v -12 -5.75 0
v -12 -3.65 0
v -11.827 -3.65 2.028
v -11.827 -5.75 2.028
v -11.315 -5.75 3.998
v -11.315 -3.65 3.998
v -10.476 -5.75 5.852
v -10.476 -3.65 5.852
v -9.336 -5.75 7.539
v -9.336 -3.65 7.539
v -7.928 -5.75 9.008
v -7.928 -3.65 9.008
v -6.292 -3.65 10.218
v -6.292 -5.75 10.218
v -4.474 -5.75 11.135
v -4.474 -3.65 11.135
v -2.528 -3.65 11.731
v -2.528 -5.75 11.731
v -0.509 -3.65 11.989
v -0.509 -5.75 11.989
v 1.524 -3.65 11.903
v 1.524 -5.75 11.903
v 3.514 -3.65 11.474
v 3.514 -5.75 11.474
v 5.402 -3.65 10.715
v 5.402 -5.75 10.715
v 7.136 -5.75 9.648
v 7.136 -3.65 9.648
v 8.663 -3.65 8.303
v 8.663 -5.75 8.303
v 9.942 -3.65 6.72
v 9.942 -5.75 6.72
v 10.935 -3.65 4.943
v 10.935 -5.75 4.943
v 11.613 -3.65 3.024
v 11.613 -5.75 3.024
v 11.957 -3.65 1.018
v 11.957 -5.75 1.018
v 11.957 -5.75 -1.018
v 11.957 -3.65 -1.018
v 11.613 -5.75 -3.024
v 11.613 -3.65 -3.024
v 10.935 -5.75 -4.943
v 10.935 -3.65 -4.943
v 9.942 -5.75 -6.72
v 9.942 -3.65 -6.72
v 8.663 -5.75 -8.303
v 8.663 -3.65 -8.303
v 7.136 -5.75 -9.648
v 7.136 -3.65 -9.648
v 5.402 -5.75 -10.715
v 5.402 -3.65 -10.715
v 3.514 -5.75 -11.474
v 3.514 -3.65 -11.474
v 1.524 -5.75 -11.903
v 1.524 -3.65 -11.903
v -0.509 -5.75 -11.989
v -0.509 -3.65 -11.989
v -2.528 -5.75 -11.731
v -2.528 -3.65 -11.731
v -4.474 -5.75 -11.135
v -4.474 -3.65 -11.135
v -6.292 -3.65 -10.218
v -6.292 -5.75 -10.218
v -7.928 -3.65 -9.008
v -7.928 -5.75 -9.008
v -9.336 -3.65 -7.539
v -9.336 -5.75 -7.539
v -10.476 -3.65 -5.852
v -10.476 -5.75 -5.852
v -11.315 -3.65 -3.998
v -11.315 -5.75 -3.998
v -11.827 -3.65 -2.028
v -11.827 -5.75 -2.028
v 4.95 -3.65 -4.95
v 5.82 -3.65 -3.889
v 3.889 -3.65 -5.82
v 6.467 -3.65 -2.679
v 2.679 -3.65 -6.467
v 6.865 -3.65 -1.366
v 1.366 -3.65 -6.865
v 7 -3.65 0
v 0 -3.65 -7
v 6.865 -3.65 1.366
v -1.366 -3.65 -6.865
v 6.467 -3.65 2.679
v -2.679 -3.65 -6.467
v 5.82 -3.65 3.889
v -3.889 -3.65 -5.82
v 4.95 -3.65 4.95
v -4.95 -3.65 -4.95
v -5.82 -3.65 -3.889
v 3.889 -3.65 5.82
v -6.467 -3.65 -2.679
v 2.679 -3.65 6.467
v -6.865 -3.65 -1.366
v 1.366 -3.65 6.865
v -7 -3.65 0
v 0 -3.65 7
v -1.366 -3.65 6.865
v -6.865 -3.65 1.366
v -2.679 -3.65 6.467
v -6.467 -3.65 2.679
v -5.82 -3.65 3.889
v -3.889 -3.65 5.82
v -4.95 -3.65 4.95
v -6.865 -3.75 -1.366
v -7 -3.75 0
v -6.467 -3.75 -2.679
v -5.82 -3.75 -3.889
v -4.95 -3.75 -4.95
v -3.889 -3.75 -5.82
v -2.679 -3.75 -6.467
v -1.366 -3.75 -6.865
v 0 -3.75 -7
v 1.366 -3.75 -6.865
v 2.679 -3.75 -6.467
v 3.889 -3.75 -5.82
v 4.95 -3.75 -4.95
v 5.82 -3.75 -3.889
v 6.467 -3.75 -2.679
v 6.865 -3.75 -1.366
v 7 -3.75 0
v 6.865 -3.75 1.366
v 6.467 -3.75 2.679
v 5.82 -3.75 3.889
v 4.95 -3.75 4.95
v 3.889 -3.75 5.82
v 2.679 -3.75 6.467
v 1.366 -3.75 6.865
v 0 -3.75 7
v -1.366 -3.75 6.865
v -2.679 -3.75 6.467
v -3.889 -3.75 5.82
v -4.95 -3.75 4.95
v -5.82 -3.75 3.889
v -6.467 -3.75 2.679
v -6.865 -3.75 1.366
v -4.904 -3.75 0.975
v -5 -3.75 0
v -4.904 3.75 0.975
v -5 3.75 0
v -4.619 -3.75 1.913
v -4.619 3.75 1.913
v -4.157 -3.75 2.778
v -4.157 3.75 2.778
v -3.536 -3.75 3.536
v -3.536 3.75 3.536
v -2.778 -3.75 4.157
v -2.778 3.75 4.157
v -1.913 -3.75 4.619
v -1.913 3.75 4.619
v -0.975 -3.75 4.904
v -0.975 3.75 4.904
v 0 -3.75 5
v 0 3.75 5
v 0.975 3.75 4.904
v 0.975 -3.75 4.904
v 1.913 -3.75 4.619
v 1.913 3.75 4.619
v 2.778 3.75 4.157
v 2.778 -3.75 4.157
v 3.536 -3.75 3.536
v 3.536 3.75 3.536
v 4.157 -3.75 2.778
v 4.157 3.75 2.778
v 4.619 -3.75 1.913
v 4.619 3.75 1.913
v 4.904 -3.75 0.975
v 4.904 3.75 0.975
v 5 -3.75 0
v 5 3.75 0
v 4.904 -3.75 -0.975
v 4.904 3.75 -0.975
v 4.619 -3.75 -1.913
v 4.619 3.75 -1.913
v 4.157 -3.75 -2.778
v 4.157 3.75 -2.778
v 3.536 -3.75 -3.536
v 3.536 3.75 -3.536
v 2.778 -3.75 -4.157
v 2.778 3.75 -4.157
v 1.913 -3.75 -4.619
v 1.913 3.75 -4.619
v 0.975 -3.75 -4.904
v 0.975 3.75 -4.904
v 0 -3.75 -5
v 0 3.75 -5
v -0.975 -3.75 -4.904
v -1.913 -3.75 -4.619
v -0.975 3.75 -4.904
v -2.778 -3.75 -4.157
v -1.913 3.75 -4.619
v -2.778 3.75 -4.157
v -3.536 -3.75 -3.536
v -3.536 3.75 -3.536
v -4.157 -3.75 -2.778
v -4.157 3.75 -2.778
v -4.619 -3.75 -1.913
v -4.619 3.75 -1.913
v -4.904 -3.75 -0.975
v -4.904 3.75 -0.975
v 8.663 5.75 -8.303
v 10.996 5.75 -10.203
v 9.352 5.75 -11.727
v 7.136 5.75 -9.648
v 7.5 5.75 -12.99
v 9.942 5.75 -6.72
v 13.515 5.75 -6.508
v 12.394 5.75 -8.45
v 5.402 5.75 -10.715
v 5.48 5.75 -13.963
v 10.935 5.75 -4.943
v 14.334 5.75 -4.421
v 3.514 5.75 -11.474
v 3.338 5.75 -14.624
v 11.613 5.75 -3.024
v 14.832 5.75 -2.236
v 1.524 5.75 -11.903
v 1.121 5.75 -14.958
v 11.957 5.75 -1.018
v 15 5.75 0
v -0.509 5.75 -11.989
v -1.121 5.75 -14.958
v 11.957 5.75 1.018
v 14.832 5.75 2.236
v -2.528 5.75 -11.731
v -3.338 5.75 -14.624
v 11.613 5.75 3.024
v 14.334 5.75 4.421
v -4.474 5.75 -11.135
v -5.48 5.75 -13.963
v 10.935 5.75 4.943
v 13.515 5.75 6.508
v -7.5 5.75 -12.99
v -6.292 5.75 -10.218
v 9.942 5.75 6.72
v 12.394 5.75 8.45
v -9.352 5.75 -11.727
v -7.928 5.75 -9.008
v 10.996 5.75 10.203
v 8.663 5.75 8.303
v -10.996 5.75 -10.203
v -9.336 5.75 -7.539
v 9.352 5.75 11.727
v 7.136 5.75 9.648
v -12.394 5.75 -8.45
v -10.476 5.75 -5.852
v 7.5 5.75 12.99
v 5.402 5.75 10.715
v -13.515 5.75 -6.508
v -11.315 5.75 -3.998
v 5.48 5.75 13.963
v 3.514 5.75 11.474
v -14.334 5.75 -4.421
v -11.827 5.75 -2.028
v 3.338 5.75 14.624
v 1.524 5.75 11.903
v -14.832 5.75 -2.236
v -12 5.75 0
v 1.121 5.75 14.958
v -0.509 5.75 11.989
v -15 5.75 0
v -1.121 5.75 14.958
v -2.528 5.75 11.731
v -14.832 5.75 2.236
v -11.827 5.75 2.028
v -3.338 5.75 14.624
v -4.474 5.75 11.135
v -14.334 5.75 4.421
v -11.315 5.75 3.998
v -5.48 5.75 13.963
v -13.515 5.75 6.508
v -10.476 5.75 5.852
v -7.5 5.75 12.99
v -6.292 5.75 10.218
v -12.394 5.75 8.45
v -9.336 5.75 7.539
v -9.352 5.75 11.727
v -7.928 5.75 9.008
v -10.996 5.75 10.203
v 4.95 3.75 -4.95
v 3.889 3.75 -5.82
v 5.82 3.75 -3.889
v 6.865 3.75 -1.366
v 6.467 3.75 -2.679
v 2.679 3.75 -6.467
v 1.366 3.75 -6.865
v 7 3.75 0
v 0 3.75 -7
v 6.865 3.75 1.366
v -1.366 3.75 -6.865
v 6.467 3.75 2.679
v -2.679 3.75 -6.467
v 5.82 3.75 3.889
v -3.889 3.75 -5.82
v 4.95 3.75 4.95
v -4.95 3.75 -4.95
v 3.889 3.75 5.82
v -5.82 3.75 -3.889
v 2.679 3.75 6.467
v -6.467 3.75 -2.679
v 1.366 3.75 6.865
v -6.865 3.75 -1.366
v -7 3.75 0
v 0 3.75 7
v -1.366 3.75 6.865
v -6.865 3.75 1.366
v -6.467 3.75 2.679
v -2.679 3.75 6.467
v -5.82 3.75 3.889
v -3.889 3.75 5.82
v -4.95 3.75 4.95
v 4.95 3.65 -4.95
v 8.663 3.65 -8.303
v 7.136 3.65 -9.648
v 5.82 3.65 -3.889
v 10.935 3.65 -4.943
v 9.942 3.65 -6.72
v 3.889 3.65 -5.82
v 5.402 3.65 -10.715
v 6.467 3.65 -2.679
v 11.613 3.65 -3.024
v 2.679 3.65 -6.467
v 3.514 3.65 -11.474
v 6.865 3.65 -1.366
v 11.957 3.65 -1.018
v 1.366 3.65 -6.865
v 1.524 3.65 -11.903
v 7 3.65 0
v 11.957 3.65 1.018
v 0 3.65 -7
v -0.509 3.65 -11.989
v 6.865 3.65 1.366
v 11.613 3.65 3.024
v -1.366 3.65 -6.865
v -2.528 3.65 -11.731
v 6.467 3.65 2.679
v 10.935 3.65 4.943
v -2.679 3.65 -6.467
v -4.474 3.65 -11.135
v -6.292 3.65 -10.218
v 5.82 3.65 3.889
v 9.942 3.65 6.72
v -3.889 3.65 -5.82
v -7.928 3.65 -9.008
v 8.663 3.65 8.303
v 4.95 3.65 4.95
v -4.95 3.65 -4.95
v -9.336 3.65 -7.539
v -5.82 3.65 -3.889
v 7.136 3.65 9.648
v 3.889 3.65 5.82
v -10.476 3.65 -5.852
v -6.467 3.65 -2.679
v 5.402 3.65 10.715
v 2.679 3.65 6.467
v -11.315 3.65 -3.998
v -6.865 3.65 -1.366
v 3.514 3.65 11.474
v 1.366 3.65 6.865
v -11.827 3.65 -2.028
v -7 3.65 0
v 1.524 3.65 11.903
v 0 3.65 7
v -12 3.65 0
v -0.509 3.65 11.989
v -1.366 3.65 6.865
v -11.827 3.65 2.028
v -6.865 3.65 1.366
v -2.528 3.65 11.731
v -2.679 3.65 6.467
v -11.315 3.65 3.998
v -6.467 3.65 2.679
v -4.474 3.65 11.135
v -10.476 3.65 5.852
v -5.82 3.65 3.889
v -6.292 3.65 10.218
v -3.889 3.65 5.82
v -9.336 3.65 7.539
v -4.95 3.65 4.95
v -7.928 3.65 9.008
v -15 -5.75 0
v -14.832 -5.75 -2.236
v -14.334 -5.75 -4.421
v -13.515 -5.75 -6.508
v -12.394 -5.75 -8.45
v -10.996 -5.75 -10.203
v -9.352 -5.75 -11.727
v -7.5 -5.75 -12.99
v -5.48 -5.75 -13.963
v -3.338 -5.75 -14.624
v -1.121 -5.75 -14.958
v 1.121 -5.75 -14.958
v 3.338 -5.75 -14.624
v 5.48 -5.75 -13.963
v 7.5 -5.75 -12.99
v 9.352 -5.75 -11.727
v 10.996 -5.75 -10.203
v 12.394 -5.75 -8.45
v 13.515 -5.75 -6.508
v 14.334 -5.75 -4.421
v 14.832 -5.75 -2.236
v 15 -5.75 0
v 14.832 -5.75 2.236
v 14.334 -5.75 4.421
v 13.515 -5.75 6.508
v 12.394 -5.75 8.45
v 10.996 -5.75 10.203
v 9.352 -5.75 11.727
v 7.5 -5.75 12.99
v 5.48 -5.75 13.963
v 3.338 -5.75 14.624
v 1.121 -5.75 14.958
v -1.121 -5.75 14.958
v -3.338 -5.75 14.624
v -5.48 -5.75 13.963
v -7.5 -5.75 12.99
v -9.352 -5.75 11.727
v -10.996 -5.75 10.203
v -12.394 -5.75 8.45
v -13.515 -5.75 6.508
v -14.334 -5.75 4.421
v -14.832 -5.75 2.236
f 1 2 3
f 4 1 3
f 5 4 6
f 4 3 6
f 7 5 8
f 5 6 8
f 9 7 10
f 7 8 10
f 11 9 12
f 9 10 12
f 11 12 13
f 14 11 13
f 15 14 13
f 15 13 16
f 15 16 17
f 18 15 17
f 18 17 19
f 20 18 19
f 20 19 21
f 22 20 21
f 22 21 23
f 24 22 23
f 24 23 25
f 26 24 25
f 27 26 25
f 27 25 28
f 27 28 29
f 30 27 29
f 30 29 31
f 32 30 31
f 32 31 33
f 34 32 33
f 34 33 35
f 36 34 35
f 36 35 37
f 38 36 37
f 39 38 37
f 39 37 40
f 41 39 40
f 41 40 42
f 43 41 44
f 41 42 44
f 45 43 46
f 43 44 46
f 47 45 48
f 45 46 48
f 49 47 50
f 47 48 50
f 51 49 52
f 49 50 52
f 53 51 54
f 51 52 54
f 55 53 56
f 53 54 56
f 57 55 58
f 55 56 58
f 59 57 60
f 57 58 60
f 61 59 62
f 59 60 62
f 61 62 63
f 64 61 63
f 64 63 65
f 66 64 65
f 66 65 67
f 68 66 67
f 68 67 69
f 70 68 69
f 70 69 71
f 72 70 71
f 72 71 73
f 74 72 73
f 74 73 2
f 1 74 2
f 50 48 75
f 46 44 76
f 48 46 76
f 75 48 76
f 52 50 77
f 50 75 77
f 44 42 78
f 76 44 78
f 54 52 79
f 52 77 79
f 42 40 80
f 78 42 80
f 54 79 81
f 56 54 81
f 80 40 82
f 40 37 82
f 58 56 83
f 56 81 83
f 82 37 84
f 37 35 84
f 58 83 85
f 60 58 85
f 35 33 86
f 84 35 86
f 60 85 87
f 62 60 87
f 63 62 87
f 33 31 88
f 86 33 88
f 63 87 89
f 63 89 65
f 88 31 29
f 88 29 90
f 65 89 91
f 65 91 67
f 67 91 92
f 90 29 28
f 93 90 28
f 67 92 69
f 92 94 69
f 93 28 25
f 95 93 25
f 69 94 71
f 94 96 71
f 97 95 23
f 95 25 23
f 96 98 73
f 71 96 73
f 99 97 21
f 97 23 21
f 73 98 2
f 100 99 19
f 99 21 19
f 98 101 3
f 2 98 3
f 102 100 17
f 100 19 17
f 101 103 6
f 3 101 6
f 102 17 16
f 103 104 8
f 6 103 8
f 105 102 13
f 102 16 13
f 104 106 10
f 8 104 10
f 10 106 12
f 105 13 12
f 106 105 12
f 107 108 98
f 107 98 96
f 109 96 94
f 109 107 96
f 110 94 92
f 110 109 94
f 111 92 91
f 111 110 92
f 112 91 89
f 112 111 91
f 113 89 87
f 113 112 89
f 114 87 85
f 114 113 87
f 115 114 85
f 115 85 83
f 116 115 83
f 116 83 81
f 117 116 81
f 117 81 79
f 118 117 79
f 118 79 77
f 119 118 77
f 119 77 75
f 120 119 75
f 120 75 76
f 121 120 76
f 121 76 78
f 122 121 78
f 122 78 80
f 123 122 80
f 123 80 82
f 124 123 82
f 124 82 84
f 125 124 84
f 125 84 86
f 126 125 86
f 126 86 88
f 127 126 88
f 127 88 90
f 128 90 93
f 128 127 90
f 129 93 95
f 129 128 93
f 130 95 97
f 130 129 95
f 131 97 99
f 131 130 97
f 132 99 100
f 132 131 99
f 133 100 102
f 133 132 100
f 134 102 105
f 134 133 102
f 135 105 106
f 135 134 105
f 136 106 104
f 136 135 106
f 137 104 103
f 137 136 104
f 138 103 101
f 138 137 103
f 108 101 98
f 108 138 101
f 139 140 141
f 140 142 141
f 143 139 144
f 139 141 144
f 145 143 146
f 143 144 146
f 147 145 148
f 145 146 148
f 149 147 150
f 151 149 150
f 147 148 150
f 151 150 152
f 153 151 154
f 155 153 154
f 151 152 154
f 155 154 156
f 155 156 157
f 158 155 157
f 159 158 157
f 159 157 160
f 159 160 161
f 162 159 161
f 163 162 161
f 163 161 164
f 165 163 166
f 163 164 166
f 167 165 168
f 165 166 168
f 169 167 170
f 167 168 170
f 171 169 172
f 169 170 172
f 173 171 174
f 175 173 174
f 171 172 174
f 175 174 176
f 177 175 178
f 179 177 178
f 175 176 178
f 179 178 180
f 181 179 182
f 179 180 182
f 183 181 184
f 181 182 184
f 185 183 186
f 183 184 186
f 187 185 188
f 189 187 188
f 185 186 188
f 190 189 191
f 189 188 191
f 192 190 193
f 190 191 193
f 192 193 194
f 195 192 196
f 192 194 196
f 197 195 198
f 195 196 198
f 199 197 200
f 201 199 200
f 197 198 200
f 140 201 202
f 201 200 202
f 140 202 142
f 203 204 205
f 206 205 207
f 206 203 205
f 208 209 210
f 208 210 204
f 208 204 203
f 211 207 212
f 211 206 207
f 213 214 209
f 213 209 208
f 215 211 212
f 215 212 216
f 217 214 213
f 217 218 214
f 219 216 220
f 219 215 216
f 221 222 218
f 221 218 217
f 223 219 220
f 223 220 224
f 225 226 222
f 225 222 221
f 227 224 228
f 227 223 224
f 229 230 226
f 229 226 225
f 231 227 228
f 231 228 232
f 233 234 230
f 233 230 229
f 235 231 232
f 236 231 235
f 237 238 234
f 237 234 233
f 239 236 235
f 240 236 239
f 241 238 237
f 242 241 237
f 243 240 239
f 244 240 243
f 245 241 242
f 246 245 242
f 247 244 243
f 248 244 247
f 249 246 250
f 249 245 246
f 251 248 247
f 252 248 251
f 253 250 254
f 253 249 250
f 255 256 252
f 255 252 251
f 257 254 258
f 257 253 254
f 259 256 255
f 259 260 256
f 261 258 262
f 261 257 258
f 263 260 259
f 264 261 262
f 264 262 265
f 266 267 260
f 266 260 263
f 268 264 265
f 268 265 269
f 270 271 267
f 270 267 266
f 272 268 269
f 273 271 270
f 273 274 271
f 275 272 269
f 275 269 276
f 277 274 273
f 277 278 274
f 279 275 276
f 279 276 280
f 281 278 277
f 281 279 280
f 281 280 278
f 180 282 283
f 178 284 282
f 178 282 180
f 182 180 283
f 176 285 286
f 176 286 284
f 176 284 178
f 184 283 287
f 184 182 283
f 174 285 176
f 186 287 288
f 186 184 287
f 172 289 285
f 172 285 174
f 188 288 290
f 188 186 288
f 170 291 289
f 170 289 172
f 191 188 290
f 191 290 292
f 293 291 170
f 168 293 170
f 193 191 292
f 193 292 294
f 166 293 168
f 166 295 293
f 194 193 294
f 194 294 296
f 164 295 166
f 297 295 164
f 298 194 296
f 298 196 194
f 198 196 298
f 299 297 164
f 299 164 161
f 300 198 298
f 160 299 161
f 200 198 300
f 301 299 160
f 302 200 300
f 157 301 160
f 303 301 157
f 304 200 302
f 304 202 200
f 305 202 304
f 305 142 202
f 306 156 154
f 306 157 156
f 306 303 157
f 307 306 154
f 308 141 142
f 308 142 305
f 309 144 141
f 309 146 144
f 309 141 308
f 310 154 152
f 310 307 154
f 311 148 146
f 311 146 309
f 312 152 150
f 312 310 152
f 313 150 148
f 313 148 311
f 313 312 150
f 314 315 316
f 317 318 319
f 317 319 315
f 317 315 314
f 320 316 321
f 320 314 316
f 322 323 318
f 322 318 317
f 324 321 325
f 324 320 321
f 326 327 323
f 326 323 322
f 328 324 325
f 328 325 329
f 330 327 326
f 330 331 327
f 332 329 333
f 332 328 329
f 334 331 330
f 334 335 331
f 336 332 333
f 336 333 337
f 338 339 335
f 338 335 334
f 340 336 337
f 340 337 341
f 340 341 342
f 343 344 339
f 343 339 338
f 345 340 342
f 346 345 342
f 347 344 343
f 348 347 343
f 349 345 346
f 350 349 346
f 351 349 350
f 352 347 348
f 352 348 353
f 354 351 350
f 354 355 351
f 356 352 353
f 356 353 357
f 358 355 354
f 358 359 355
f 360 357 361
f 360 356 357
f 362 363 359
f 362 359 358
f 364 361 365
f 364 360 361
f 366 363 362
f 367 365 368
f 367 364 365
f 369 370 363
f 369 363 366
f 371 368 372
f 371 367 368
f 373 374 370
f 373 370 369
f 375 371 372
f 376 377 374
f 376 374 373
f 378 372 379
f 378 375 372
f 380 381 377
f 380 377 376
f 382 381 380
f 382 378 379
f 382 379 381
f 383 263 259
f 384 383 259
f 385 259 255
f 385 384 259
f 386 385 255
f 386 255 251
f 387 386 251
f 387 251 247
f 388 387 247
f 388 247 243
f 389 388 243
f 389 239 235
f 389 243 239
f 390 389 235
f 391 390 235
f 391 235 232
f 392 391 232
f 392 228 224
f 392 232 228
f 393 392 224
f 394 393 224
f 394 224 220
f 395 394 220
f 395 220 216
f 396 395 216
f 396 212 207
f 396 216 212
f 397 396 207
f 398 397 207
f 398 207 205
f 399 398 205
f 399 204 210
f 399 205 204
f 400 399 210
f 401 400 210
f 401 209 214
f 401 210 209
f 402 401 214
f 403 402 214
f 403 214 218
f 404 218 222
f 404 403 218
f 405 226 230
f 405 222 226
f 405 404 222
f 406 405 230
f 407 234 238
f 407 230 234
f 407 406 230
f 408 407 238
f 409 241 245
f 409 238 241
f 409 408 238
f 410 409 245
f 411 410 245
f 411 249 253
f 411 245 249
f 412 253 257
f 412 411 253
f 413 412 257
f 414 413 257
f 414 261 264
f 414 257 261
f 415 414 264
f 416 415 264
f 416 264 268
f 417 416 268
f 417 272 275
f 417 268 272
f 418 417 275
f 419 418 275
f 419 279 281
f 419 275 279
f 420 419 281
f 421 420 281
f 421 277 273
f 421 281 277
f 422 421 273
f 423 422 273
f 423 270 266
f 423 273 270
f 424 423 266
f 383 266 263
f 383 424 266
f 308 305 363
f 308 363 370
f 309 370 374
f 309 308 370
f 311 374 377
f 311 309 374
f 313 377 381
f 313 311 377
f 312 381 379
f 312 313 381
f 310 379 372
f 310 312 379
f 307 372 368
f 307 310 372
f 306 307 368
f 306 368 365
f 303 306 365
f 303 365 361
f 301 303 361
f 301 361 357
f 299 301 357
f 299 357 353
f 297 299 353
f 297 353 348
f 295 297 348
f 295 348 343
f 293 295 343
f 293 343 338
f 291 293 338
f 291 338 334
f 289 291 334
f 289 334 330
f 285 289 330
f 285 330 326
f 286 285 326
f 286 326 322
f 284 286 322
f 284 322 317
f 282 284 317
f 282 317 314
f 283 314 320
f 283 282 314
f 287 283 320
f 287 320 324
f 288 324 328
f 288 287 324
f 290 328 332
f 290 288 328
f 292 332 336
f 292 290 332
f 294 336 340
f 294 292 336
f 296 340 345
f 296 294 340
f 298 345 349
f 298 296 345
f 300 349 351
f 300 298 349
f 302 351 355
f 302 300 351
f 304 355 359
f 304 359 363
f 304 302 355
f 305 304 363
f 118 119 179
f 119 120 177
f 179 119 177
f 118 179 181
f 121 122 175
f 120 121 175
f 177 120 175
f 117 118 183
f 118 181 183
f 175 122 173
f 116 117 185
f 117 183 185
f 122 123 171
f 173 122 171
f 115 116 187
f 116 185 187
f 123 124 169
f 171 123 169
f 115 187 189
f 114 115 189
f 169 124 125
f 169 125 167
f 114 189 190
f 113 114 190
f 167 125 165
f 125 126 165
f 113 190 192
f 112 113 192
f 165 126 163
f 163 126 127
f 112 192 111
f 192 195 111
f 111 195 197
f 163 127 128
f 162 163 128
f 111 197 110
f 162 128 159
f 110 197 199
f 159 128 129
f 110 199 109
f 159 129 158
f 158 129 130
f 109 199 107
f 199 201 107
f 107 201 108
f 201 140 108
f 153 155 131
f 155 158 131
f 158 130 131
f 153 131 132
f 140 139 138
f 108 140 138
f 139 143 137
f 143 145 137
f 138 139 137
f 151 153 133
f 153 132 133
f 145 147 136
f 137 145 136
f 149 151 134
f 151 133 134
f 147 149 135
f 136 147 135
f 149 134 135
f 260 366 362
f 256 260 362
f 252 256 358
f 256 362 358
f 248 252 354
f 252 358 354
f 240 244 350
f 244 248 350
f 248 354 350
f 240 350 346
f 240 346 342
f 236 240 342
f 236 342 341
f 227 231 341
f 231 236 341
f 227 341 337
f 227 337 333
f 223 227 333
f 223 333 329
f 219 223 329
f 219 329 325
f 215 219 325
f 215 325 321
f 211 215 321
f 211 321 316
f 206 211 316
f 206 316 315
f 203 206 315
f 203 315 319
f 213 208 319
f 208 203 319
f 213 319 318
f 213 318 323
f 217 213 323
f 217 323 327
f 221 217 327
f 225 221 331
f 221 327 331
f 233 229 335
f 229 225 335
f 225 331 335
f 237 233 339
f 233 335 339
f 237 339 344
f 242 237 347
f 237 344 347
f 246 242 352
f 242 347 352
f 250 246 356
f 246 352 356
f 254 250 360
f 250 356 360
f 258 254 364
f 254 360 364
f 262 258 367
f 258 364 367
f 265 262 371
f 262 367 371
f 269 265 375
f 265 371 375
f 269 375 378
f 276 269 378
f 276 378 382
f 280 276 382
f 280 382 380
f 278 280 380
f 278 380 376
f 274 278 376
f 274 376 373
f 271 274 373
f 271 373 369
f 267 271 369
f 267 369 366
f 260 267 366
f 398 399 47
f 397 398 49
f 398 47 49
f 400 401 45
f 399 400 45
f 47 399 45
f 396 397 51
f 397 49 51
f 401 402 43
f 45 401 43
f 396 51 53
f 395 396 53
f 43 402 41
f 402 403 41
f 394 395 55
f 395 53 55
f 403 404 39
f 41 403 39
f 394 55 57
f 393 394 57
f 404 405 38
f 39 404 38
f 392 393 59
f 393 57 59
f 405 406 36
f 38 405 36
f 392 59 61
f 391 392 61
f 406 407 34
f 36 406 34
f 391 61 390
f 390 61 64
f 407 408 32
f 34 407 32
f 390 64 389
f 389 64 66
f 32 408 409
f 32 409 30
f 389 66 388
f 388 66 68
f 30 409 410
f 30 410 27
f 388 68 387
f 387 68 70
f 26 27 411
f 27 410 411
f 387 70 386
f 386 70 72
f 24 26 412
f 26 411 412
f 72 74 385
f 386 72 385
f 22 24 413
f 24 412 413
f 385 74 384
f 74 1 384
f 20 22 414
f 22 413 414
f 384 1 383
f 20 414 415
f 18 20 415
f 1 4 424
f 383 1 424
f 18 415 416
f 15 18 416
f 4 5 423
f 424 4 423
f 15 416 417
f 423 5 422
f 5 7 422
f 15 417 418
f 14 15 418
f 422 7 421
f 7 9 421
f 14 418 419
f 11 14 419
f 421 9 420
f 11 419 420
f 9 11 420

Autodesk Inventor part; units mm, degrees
ref_plane "YZ Plane" through (0, 0, 0) normal (1, 0, 0) x (0, 1, 0)
ref_plane "XZ Plane" through (0, 0, 0) normal (0, 1, 0) x (-1, 0, 0)
ref_plane "XY Plane" through (0, 0, 0) normal (0, 0, 1) x (1, 0, 0)
sketch "スケッチ1" plane through (0, 0, 0) normal (0, 0, 1) x (1, 0, 0)
  line L0 (-15, 5.75) -> (-15, -5.75)
  line L1 (-15, -5.75) -> (-12, -5.75)
  line L2 (-12, -5.75) -> (-12, -3.65)
  line L3 (-12, -3.65) -> (-7, -3.65)
  line L4 (-7, -3.65) -> (-7, -3.75)
  line L5 (-7, -3.75) -> (-5, -3.75)
  line L6 (-5, -3.75) -> (-5, 3.75)
  line L7 (0, 0) -> (-15, 0) construction
  line L8 (-15, 5.75) -> (-12, 5.75)
  line L9 (-12, 5.75) -> (-12, 3.65)
  line L10 (-12, 3.65) -> (-7, 3.65)
  line L11 (-7, 3.65) -> (-7, 3.75)
  line L12 (-7, 3.75) -> (-5, 3.75)
  line L13 (0, 0) -> (0, 5.75) construction
  point P0 (-5, 0)
  dimension "d0" = 11.5
  dimension "d1" = 15
  dimension "d2" = 5
  dimension "d3" = 0.1
  dimension "d4" = 2
  dimension "d5" = 3
  dimension "d6" = 2
revolve "回転1" add sketch "スケッチ1" angle 360 about axis through (0, 0, 0) along (0, 1, 0)
properties part number "Gbear_30_10" material "ステンレス鋼"
